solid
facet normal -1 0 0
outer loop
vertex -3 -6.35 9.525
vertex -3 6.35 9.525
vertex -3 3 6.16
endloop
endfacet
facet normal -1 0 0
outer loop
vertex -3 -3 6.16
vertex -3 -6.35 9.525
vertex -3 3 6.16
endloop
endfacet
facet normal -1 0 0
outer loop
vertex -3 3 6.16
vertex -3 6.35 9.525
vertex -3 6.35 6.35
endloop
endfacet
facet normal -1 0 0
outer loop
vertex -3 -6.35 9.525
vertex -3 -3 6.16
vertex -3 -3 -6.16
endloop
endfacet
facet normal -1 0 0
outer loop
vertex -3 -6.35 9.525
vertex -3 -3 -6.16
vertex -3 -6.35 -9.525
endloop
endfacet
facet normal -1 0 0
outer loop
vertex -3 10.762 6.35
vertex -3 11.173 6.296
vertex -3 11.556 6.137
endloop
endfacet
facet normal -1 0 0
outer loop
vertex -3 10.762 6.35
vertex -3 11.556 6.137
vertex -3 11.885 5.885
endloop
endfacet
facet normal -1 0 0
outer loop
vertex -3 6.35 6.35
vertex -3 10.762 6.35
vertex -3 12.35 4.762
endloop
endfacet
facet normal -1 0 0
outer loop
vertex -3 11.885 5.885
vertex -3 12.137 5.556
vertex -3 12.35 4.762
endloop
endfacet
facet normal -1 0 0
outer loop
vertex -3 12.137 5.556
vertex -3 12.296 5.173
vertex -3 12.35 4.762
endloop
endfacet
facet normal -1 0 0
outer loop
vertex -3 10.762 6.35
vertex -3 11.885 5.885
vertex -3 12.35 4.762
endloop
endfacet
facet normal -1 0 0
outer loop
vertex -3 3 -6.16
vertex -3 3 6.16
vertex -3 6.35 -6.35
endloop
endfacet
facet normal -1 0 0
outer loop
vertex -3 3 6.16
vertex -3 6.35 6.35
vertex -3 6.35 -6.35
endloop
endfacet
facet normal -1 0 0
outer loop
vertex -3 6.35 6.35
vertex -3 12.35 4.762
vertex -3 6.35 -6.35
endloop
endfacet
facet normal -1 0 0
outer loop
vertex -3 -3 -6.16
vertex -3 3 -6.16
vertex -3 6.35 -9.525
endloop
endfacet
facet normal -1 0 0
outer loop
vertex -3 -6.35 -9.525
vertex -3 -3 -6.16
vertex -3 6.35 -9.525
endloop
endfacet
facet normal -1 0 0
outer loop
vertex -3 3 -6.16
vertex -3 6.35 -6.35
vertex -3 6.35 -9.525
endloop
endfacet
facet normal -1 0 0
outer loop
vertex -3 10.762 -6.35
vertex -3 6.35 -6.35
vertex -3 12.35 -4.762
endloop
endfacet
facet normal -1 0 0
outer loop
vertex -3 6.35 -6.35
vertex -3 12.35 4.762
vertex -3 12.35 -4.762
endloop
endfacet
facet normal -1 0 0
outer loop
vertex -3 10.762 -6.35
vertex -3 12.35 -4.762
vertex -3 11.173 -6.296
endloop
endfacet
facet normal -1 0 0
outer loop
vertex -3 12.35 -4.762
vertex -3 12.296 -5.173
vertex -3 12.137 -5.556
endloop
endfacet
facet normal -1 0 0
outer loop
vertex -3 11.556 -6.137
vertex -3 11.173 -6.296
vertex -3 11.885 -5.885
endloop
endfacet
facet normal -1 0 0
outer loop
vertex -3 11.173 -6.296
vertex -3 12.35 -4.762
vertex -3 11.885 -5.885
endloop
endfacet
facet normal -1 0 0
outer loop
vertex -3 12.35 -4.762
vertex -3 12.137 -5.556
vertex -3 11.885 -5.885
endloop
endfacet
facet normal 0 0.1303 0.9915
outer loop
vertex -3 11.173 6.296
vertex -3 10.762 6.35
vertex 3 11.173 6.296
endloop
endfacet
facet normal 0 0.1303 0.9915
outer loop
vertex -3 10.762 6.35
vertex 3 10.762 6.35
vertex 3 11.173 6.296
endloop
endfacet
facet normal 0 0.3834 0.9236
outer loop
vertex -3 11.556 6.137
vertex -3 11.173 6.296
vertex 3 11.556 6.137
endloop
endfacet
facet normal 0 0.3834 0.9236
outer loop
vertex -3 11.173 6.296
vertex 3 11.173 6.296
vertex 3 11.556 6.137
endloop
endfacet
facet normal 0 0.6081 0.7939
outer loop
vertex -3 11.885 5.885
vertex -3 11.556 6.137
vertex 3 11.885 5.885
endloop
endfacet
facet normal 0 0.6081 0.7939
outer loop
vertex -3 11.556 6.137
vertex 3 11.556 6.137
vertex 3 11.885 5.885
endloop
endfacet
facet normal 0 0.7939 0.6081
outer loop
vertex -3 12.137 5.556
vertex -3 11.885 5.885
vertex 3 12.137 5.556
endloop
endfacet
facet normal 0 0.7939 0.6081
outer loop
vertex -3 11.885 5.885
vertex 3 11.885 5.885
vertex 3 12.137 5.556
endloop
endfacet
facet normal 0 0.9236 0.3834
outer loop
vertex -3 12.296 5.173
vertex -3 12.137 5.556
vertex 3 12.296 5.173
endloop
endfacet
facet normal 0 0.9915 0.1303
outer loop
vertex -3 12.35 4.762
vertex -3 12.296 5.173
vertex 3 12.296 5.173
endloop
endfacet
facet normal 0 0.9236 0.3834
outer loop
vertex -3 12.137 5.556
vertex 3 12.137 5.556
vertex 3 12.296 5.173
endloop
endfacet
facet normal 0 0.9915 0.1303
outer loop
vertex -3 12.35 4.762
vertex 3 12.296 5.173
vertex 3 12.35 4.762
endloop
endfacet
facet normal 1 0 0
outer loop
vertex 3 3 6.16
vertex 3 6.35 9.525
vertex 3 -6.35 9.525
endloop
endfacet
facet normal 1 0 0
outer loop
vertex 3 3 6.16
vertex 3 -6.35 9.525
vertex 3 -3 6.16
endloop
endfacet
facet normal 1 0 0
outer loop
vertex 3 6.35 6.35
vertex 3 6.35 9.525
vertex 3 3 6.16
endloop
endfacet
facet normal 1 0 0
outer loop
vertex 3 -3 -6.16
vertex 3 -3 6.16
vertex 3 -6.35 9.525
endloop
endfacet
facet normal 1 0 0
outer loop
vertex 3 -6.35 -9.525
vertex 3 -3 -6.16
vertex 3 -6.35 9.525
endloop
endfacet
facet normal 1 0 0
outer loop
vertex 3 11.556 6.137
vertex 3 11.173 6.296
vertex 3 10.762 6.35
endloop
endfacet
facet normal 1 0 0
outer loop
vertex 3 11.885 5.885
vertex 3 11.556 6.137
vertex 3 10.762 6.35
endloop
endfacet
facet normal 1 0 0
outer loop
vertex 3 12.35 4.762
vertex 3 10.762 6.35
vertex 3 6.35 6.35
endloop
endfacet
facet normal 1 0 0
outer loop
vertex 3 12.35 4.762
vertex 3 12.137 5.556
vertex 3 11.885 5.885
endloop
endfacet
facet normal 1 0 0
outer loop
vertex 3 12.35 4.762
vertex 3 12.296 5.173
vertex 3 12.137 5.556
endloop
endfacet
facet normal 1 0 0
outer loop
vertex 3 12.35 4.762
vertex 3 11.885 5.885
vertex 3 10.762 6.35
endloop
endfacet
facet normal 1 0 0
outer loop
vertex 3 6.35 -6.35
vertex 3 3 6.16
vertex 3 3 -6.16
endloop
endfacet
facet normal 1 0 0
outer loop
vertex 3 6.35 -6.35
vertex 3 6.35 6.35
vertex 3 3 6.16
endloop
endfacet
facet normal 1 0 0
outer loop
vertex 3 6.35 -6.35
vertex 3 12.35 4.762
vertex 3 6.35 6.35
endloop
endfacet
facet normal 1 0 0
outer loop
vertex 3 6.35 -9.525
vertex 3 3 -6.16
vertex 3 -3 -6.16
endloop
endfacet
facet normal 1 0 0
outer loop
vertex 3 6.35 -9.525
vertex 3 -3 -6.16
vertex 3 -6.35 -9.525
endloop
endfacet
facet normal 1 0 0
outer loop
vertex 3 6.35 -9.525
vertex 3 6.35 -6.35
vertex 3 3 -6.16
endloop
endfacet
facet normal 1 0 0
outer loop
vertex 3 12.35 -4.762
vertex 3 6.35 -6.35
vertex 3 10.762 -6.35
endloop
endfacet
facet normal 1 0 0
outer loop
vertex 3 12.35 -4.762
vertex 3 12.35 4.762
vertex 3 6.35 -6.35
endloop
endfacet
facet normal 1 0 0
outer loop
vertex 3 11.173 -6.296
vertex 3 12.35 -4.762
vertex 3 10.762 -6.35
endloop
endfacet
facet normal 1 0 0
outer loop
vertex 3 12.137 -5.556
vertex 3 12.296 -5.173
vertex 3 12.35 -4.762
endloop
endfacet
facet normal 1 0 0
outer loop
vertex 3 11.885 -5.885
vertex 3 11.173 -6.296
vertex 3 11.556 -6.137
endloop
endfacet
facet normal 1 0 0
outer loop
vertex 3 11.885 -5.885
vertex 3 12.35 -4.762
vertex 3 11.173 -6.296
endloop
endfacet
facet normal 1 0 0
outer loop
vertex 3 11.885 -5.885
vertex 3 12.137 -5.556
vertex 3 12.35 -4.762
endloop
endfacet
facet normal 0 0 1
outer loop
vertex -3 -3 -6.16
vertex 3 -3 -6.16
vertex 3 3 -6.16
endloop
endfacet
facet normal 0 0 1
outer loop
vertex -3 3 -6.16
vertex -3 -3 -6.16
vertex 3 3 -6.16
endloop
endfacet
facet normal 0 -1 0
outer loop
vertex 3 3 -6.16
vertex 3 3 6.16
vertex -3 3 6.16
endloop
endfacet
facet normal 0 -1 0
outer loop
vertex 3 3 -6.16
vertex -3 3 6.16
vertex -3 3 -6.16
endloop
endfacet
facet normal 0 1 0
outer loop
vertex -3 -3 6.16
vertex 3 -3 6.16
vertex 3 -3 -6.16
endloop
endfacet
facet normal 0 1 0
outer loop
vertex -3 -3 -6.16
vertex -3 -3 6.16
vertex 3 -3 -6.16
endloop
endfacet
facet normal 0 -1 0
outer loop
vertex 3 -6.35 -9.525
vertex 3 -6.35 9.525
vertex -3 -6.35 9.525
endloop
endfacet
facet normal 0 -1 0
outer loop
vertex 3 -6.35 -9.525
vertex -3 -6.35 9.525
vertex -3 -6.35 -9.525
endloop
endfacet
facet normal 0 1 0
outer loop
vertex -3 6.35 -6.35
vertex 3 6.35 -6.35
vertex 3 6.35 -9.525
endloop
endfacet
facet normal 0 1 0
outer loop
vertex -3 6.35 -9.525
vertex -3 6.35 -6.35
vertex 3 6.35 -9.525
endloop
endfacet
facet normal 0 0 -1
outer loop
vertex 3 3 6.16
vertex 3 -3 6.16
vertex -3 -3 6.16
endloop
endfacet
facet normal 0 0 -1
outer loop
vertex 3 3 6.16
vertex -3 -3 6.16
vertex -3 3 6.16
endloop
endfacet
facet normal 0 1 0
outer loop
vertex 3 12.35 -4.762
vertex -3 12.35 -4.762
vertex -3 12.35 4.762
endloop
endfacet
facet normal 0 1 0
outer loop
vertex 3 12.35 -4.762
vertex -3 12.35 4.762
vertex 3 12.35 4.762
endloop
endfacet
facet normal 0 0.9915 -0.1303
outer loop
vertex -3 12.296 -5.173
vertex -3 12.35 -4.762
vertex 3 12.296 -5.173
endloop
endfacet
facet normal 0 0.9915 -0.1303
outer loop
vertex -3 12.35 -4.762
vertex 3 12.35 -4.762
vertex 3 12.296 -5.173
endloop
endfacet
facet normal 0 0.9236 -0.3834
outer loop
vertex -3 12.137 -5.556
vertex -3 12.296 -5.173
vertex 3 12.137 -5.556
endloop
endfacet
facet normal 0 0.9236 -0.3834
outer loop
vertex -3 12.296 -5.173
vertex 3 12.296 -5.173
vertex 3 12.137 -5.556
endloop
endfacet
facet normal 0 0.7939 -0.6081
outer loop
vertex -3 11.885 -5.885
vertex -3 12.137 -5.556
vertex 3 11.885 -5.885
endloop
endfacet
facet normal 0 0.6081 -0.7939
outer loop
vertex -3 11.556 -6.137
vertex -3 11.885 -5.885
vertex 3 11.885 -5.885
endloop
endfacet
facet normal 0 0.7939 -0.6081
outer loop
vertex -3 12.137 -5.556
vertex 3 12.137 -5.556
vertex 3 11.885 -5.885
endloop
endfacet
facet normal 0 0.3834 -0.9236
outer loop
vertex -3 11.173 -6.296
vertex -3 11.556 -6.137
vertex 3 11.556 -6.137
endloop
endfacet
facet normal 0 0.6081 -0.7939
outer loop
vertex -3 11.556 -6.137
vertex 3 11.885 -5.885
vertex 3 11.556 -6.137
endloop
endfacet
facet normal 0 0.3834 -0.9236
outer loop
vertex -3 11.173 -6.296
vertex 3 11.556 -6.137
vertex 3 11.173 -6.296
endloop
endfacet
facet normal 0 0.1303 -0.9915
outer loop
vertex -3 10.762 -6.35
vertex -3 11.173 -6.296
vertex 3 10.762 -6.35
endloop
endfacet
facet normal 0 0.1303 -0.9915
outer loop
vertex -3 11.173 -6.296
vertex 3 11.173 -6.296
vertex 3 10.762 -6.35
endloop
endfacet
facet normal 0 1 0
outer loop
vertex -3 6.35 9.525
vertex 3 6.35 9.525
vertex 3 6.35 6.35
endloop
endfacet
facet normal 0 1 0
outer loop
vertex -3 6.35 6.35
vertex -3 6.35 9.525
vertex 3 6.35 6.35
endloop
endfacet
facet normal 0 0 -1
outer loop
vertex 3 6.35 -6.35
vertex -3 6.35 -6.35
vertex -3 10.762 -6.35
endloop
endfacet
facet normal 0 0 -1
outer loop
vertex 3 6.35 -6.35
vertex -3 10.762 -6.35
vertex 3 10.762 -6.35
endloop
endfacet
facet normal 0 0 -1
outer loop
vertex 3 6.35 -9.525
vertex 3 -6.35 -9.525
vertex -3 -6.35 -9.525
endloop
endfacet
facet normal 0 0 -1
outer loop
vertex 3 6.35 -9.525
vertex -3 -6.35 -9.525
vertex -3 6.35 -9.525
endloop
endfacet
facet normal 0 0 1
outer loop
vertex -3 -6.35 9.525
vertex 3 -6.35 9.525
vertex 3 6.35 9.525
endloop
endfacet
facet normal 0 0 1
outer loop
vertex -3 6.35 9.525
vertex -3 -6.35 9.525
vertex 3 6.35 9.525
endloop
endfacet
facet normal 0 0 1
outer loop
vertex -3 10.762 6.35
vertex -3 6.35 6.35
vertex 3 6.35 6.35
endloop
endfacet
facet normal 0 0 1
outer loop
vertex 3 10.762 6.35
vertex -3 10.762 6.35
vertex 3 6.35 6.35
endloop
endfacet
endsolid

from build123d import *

# Parameters (mm, degrees)
SKETCH1_W           = 19.05
SKETCH1_H           = 12.7
BOSS_EXTRUDE1_DEPTH = 3
SKETCH2_W           = 6
SKETCH2_H           = 12.7
BOSS_EXTRUDE2_DEPTH = 6
SKETCH3_W           = 12.319
SKETCH3_H           = 5.999999938
CUT_EXTRUDE1_DEPTH  = 17.710718865
FILLET1_R           = 1.5875


with BuildPart() as part:
    # Sketch1 → Boss-Extrude1 (new, symmetric)
    with BuildSketch(Plane(origin=(0, 0, 0), x_dir=(0, 0, -1), z_dir=(1, 0, 0))):
        Rectangle(SKETCH1_W, SKETCH1_H)
    extrude(amount=BOSS_EXTRUDE1_DEPTH, both=True)

    # Sketch2 → Boss-Extrude2 (add)
    with BuildSketch(Plane(origin=(0, 6.35, 0), x_dir=(1, 0, 0), z_dir=(0, 1, 0))):
        Rectangle(SKETCH2_W, SKETCH2_H)
    extrude(amount=BOSS_EXTRUDE2_DEPTH)

    # Sketch3 → Cut-Extrude1 (cut, through all)
    with BuildSketch(Plane(origin=(3, 0, 0), x_dir=(0, 0, -1), z_dir=(1, 0, 0))):
        Rectangle(SKETCH3_W, SKETCH3_H)
    extrude(amount=-CUT_EXTRUDE1_DEPTH, mode=Mode.SUBTRACT)

    # Fillet1
    fillet1_edges = [part.edges().sort_by_distance(p)[0] for p in [
        (0, 12.35, -6.35),
        (0, 12.35, 6.35),
    ]]
    fillet(fillet1_edges, radius=FILLET1_R)


solid = part.part
